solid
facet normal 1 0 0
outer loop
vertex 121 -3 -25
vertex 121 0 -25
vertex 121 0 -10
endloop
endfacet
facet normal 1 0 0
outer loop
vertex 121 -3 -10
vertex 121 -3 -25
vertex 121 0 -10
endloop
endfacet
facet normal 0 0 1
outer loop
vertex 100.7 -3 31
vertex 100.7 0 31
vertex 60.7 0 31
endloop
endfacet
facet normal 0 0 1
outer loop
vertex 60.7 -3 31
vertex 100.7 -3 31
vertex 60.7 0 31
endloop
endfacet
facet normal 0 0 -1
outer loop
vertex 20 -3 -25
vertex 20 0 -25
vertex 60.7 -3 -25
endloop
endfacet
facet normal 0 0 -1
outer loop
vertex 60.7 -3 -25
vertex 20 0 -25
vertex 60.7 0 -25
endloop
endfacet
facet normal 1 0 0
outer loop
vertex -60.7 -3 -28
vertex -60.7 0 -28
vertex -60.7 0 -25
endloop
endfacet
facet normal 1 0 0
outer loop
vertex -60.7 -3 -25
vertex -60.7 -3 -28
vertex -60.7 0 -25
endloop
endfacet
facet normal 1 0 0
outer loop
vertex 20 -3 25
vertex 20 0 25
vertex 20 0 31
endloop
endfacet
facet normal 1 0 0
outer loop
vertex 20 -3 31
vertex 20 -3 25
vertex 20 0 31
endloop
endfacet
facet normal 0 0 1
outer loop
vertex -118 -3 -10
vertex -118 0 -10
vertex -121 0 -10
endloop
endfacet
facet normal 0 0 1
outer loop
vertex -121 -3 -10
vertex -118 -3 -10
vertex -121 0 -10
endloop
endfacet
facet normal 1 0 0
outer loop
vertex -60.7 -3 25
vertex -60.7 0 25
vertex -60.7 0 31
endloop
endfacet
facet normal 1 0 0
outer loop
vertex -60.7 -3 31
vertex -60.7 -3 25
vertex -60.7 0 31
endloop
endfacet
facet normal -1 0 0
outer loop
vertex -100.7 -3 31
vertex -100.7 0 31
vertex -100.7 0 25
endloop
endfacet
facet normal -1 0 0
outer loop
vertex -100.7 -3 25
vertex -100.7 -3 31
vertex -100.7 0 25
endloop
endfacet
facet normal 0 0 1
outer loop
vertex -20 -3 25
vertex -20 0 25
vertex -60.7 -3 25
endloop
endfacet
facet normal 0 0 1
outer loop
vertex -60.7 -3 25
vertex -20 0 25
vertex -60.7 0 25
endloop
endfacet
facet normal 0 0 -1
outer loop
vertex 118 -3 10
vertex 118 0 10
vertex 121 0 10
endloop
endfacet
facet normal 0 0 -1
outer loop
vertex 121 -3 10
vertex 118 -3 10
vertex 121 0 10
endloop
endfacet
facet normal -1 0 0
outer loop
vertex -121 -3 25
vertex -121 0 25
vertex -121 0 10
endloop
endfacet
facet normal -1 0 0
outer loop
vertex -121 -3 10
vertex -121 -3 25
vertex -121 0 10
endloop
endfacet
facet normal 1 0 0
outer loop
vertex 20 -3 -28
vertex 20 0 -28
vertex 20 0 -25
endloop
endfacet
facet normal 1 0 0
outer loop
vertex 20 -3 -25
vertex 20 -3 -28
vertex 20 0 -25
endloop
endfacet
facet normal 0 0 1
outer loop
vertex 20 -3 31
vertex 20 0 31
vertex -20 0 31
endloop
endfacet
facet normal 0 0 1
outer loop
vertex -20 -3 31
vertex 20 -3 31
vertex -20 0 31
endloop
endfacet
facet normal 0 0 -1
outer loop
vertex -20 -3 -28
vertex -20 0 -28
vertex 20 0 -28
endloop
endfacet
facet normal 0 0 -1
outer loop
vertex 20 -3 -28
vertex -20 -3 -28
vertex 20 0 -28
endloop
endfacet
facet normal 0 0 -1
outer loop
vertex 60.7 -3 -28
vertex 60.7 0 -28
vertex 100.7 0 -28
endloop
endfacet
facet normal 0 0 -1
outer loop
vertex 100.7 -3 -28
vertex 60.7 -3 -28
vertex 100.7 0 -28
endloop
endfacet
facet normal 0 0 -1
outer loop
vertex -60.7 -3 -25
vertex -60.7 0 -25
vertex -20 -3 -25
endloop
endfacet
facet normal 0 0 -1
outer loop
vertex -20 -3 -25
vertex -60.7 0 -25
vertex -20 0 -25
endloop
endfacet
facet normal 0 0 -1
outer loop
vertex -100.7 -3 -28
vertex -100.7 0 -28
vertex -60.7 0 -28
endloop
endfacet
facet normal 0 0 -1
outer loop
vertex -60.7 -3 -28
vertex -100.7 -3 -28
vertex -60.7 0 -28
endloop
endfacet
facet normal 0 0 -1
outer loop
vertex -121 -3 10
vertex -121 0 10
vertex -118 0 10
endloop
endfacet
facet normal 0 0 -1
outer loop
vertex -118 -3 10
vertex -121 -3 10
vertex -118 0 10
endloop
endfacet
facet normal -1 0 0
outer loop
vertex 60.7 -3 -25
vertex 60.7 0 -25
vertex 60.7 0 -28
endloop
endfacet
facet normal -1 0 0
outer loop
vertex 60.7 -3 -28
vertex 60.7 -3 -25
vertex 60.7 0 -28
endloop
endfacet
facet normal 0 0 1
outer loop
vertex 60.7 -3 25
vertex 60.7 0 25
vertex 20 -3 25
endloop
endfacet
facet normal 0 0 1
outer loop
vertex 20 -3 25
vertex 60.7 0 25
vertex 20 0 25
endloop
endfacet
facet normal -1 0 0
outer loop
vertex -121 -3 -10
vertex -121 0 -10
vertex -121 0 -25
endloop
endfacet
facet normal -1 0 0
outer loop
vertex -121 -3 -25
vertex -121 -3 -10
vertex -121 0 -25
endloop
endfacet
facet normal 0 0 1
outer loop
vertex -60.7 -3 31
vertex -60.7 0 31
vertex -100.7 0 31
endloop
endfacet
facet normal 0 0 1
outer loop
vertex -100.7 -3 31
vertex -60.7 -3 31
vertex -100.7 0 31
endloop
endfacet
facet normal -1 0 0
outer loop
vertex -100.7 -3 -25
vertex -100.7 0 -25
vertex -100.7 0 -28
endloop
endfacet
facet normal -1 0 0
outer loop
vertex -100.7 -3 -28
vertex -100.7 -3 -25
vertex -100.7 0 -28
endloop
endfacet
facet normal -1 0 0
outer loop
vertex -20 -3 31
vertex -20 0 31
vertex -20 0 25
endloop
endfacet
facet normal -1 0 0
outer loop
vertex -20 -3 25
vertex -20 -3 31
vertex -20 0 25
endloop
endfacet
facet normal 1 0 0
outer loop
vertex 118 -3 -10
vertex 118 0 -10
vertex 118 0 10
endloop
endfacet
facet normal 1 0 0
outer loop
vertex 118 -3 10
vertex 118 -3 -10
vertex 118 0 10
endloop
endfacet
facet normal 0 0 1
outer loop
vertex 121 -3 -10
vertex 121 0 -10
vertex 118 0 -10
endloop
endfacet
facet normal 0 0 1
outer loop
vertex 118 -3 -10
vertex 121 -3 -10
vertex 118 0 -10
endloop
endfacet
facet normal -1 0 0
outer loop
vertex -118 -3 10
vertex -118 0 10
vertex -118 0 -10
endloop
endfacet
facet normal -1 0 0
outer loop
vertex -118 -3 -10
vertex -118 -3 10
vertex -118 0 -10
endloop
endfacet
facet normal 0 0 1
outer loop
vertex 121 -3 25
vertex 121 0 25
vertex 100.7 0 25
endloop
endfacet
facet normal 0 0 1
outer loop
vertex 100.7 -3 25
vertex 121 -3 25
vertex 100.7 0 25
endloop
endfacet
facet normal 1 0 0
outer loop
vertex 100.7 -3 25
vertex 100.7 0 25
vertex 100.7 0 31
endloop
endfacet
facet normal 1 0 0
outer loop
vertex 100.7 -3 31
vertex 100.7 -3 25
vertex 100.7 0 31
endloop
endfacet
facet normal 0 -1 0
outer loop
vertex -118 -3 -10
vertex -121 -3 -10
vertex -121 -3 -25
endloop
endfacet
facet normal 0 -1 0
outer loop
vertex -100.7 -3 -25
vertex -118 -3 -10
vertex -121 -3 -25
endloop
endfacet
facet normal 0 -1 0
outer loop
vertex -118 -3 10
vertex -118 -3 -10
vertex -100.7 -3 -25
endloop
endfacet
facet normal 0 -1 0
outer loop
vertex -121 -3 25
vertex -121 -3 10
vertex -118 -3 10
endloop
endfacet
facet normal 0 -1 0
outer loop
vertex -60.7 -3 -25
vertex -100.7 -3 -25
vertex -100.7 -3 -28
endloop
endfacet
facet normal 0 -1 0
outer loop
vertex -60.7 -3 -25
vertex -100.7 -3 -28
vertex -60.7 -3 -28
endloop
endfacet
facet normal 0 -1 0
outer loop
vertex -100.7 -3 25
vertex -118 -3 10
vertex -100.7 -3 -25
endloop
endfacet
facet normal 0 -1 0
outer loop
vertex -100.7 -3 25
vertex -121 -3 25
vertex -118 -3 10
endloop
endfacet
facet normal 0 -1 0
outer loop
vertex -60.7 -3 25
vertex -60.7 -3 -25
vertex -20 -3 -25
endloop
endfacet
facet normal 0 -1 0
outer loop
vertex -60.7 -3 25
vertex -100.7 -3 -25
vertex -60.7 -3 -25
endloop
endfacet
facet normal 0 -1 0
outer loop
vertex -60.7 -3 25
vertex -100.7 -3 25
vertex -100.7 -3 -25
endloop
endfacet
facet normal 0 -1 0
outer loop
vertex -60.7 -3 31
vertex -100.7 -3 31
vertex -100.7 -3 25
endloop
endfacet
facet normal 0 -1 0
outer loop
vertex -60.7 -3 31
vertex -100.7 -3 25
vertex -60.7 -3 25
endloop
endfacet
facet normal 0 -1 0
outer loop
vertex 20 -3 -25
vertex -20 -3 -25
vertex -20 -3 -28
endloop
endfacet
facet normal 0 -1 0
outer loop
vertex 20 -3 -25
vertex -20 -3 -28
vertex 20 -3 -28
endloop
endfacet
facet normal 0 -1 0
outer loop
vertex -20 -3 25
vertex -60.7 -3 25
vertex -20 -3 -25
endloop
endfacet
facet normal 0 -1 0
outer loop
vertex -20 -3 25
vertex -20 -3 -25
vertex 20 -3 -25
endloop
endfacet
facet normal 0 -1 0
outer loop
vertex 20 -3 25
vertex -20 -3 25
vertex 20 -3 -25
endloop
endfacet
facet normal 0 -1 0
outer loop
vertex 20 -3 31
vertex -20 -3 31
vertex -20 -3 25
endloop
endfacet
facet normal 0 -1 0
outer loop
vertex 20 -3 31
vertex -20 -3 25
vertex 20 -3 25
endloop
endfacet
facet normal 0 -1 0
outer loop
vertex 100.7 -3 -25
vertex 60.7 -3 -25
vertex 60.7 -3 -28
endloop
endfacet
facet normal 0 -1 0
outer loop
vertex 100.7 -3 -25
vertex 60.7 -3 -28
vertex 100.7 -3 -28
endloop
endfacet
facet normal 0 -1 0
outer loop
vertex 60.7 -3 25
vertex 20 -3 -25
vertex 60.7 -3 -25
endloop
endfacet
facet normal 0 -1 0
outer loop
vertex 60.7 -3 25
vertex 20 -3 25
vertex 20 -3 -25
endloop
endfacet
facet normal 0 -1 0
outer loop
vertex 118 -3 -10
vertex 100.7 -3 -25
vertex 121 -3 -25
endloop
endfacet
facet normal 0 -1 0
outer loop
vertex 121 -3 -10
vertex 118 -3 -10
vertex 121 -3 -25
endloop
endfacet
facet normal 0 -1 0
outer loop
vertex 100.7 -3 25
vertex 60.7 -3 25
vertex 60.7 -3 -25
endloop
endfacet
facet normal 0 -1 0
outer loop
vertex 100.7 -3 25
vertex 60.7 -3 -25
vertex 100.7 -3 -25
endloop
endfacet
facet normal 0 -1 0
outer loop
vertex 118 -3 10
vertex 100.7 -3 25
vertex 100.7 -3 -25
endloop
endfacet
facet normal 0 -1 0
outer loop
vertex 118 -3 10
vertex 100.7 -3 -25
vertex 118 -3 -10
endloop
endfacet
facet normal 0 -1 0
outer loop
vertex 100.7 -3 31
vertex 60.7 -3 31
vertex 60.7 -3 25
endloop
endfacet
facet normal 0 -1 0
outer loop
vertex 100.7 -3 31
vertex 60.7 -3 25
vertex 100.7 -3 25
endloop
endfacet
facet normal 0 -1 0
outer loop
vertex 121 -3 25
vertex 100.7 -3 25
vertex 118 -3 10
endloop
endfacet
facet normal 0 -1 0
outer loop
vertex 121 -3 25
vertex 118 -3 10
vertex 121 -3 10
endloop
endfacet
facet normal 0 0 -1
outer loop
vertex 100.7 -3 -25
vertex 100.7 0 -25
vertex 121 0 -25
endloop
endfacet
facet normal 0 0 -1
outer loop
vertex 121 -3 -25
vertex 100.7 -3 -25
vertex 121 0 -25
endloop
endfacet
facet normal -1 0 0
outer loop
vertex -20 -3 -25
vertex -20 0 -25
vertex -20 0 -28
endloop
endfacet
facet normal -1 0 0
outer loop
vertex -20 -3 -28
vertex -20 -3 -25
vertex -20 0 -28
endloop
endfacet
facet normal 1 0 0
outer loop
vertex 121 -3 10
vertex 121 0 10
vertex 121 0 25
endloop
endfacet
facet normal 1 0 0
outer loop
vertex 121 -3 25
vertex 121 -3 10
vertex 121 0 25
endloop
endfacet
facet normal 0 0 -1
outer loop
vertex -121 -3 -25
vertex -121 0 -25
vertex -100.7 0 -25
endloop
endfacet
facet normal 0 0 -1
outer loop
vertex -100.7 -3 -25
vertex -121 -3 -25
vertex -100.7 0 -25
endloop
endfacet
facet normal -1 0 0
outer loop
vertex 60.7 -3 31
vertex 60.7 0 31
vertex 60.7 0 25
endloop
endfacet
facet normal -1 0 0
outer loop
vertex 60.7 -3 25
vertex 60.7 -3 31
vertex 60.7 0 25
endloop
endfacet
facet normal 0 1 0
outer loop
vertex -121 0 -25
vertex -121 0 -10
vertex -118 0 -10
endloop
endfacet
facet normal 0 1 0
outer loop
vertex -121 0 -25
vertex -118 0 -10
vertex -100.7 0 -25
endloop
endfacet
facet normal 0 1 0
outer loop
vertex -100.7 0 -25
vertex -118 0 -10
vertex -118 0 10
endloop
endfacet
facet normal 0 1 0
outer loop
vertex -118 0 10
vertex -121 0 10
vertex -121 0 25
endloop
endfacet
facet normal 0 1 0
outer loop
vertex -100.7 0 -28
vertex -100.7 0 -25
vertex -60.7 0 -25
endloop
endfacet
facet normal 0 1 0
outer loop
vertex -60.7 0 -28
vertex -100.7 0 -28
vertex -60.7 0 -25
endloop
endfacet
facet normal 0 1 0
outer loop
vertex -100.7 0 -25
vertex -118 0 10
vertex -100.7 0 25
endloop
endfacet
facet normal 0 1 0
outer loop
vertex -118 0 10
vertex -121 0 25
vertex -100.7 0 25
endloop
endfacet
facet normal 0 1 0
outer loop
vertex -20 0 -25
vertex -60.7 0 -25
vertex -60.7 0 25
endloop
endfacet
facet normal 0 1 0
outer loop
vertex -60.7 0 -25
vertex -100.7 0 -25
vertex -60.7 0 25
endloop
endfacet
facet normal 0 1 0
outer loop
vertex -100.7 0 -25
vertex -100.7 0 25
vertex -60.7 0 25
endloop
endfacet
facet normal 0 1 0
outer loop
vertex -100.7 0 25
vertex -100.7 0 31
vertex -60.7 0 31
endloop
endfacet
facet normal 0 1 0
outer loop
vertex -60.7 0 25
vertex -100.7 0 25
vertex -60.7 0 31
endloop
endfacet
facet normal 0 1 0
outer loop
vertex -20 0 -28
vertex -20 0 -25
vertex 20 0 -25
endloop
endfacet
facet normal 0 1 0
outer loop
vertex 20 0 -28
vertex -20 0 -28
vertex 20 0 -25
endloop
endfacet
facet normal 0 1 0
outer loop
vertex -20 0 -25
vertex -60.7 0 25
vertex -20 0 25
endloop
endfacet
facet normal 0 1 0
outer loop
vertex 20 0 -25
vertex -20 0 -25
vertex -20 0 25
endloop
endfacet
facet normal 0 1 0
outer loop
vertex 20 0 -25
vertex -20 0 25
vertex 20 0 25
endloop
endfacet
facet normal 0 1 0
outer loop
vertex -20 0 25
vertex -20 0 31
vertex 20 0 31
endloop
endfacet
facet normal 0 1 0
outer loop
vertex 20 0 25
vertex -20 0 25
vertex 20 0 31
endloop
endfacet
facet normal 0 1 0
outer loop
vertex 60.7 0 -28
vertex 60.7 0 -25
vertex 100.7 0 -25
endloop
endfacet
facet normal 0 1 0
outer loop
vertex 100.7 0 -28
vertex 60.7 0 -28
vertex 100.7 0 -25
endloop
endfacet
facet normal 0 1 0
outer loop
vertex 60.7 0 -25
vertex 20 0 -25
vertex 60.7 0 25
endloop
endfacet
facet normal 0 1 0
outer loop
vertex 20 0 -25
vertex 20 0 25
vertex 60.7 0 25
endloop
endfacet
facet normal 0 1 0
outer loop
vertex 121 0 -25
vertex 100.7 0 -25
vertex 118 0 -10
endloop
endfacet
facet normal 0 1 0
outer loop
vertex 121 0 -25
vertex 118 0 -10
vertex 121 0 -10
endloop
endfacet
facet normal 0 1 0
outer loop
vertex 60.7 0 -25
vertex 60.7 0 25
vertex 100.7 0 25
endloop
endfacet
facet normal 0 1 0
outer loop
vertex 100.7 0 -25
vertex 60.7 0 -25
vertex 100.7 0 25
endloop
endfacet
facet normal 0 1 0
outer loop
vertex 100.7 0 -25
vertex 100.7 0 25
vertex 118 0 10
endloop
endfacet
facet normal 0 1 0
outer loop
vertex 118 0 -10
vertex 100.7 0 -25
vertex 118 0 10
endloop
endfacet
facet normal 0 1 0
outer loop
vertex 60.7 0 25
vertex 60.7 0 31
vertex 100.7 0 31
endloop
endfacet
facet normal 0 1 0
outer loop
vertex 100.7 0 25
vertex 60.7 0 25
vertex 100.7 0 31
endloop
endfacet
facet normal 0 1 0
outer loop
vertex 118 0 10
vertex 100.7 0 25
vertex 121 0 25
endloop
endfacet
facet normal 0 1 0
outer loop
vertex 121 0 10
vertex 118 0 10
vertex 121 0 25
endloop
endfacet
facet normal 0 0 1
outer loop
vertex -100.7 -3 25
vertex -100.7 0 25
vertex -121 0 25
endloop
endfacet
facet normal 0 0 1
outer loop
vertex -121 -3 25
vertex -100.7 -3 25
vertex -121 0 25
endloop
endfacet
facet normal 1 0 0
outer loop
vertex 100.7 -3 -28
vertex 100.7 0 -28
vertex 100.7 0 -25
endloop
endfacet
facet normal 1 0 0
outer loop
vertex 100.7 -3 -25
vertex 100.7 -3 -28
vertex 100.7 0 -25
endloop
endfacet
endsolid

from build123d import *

# Parameters (mm, degrees)
F1_DEPTH = 3


with BuildPart() as f1:
    # F0 (on Front) → F1 (new body)
    with BuildSketch(Plane.XZ):
        Polygon((100.7, -25), (121, -25), (121, -10), (118, -10), (118, 10), (121, 10), (121, 25), (100.7, 25), (100.7, 28), (100.7, 31), (60.7, 31), (60.7, 28), (60.7, 25), (20, 25), (20, 28), (20, 31), (-20, 31), (-20, 28), (-20, 25), (-60.7, 25), (-60.7, 28), (-60.7, 31), (-100.7, 31), (-100.7, 28), (-100.7, 25), (-121, 25), (-121, 10), (-118, 10), (-118, -10), (-121, -10), (-121, -25), (-100.7, -25), (-100.7, -28), (-60.7, -28), (-60.7, -25), (-20, -25), (-20, -28), (20, -28), (20, -25), (60.7, -25), (60.7, -28), (100.7, -28), align=None)
    extrude(amount=F1_DEPTH)


solid = f1.part
